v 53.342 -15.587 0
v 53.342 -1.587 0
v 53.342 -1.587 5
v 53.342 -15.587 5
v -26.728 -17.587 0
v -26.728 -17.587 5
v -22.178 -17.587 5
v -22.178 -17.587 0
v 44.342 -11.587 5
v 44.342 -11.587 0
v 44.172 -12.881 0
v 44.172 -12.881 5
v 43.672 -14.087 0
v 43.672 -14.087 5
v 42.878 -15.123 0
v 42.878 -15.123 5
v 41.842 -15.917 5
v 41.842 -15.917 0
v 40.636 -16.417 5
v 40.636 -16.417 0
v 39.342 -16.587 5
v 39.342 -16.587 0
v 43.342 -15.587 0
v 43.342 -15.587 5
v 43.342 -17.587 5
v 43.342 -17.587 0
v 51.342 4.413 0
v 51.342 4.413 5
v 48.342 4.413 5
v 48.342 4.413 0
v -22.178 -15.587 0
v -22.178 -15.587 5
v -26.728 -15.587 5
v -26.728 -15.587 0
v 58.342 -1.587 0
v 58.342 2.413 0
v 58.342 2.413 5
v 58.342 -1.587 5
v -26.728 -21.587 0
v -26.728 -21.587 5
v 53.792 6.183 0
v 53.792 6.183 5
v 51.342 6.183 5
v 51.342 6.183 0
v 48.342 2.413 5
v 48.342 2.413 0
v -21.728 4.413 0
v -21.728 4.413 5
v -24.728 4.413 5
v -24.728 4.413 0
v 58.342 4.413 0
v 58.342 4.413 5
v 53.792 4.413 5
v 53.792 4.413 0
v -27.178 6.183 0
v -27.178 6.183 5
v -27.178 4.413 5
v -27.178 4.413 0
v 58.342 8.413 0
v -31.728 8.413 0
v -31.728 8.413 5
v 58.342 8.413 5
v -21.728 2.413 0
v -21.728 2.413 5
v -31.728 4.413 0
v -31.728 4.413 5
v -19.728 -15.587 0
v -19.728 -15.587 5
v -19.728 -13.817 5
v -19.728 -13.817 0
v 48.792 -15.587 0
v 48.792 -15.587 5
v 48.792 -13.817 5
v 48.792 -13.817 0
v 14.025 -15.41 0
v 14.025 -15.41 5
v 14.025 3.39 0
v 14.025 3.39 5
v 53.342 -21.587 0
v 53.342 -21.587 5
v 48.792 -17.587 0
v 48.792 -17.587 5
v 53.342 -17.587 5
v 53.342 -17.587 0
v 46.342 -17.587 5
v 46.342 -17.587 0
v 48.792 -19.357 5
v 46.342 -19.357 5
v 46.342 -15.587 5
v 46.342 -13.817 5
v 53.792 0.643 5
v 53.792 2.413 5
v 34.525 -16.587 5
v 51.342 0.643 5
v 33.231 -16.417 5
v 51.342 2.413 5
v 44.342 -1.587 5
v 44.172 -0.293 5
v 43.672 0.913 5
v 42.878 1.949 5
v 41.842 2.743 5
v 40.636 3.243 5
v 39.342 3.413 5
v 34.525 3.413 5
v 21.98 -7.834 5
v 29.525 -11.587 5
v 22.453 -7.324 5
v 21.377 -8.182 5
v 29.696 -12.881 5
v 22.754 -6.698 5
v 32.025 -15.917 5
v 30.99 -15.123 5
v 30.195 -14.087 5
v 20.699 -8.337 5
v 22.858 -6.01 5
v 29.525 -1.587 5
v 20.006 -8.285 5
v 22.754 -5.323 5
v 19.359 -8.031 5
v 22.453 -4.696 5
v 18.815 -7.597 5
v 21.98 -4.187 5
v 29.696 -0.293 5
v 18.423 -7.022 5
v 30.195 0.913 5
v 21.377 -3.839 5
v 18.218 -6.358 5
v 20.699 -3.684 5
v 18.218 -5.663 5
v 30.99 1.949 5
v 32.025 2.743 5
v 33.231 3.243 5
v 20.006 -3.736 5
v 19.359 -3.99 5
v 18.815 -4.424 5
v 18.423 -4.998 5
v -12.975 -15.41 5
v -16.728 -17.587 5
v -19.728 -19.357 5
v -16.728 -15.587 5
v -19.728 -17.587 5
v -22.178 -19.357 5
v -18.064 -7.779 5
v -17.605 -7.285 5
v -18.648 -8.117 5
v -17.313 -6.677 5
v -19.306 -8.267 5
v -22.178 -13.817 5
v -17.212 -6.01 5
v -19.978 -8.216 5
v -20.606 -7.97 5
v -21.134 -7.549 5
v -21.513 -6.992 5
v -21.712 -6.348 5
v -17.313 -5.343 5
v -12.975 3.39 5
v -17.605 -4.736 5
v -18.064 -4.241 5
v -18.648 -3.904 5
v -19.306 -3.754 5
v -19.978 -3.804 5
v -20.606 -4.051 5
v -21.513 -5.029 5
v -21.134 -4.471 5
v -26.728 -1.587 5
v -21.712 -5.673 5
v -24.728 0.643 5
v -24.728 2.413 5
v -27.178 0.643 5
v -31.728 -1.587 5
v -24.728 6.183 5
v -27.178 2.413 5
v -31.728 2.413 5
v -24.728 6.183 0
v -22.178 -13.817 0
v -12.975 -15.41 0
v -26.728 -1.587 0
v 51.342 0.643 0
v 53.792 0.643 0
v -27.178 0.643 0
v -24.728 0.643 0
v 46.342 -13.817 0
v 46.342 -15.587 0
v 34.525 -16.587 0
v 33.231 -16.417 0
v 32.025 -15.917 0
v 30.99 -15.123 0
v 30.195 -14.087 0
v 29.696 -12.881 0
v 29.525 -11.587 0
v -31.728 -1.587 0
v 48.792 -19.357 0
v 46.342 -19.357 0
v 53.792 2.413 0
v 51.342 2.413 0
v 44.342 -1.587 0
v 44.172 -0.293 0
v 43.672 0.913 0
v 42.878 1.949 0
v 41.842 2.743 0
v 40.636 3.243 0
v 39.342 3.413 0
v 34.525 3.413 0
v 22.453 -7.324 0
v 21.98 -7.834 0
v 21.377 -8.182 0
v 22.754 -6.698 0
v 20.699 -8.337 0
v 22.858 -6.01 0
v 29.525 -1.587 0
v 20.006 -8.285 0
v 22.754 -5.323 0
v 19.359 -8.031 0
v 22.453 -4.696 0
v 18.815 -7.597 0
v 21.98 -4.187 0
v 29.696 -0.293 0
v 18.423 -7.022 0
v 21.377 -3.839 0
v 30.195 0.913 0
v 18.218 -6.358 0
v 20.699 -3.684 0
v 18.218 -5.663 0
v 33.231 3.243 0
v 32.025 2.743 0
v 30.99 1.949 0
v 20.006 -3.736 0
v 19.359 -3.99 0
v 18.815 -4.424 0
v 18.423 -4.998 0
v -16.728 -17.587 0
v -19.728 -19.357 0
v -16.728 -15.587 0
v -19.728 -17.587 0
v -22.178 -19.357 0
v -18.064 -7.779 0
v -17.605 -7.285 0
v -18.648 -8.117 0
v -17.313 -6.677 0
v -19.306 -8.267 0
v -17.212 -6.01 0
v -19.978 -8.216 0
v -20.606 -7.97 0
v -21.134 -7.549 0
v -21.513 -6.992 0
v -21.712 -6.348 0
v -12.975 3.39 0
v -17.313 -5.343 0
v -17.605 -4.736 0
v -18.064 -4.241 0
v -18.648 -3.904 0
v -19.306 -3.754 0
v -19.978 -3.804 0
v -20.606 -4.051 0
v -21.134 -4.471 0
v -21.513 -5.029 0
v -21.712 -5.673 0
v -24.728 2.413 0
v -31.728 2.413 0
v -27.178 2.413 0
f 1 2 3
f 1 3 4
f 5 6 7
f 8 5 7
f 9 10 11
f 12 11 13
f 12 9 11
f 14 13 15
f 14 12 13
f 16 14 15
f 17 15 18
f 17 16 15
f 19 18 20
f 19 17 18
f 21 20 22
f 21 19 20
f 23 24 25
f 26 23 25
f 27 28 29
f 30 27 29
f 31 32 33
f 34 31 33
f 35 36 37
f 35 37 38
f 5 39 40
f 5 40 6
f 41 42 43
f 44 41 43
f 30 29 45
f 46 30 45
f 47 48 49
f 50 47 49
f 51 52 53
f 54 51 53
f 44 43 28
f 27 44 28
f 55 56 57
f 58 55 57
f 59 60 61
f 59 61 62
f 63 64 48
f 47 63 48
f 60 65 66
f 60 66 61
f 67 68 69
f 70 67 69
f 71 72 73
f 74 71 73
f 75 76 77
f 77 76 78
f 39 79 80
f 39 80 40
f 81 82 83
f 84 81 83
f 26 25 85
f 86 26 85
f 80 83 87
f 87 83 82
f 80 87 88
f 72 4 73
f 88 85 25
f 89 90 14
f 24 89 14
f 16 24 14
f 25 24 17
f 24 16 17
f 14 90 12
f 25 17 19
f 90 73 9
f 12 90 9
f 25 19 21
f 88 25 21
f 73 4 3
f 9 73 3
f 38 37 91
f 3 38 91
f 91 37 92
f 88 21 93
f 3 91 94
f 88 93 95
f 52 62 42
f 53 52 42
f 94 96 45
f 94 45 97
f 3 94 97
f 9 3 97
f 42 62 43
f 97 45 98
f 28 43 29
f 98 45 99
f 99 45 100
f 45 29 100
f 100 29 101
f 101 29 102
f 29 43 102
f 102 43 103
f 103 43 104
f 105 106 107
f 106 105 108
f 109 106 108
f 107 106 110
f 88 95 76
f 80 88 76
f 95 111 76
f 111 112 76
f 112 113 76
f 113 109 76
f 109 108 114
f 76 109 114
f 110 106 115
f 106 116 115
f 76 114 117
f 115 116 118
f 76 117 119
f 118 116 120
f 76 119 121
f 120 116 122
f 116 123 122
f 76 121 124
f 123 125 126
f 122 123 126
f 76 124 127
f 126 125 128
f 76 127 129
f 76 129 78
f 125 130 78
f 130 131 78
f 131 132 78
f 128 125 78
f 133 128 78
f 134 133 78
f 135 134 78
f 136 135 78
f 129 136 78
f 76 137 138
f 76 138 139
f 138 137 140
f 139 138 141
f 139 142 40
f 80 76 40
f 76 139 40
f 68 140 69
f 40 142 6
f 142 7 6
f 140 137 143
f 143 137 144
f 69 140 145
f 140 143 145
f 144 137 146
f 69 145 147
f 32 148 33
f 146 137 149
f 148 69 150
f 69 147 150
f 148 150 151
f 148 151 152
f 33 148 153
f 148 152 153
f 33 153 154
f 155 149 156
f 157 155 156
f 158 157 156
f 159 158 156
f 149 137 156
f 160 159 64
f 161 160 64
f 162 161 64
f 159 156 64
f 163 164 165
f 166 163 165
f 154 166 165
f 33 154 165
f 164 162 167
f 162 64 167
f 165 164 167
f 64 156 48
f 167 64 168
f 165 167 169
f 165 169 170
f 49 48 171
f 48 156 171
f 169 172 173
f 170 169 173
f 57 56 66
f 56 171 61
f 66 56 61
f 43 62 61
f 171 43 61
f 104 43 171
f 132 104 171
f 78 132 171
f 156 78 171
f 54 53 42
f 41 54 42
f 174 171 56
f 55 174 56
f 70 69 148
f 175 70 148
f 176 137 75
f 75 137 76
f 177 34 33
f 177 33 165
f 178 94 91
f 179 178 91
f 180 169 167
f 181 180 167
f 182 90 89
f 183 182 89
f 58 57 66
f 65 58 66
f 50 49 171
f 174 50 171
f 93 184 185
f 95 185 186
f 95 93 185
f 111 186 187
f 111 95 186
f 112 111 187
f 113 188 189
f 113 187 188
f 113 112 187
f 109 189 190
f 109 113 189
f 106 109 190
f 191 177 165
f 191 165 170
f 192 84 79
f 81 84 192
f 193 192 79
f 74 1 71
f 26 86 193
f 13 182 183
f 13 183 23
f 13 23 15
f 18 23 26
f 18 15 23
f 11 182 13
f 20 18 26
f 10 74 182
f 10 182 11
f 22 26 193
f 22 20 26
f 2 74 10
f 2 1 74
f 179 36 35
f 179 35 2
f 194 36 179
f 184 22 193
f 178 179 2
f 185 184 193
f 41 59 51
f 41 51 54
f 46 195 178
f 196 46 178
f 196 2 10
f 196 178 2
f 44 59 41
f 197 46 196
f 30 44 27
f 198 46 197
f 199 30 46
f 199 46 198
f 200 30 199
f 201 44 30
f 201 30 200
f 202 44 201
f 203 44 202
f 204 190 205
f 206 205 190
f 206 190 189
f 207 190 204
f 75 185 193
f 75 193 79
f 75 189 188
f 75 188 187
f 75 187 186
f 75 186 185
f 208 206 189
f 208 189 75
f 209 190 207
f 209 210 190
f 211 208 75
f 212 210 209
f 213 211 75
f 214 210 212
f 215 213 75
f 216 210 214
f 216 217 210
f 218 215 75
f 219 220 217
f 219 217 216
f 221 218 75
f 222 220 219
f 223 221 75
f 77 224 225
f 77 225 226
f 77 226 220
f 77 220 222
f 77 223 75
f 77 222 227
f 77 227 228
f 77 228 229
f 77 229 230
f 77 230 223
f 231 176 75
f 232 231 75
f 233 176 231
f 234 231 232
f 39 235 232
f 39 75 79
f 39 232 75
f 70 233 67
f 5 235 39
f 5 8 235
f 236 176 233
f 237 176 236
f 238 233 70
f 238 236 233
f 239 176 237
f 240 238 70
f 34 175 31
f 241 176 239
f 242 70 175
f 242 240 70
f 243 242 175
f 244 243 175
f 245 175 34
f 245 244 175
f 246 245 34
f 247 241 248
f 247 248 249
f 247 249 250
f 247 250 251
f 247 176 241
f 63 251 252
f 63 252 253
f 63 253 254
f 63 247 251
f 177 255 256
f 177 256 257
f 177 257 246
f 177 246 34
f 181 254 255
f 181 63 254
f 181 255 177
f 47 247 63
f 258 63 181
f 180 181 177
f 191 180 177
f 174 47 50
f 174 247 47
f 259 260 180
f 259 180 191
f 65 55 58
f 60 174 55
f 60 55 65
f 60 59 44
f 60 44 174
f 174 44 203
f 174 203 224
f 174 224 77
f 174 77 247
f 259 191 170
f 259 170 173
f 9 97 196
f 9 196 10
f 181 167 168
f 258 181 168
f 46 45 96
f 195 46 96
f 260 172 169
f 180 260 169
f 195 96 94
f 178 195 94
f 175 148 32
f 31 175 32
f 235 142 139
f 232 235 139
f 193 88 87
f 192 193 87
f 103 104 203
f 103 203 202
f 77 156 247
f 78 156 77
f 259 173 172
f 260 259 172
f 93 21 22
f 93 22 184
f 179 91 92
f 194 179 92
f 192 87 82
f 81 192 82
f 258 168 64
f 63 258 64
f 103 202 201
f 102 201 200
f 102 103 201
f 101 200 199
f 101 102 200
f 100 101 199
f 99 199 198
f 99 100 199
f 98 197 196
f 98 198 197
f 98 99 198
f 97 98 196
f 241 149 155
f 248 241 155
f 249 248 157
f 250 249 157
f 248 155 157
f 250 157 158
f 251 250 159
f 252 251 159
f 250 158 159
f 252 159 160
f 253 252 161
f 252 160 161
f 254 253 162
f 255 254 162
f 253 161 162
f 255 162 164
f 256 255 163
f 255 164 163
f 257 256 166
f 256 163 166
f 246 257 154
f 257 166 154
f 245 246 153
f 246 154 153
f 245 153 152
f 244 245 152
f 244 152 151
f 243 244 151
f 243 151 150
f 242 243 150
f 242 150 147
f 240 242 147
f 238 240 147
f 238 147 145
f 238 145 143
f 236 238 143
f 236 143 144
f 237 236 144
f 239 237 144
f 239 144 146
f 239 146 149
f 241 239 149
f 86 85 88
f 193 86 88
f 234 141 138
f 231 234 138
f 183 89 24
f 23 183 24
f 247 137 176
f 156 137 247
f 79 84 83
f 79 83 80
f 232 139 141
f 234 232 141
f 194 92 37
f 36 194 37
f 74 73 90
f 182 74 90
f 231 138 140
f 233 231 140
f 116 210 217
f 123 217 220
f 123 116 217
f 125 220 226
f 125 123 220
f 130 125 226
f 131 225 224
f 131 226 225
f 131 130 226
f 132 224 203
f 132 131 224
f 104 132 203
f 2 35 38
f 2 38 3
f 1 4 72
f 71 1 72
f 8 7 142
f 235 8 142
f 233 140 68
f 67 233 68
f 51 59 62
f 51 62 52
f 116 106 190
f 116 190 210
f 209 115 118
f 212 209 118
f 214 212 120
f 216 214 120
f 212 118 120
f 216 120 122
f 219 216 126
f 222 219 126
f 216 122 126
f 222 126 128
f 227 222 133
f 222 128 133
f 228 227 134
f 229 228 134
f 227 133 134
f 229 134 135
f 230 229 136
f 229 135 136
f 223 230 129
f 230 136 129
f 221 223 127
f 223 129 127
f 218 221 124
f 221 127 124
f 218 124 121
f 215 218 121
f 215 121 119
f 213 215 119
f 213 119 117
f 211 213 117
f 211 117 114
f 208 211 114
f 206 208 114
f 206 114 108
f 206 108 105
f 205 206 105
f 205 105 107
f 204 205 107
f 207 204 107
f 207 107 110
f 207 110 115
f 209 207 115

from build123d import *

# Parameters (mm, degrees)
RESSALTO_EXTRUS_O1_DEPTH = 5
CORTE_EXTRUS_O1_DEPTH    = 6
ESBO_O3_R                = 2.262708027
ESBO_O3_R_2              = 2.332727501
ESBO_O3_W                = 27
ESBO_O3_H                = 18.8
CORTE_EXTRUS_O2_DEPTH    = 6


with BuildPart() as part:
    # Esboço1 → Ressalto-extrusão1 (new body)
    with BuildSketch(Plane.XY):
        Polygon((-26.727783806, -21.587024793), (-26.727783806, -1.587024793), (-31.727783806, -1.587024793), (-31.727783806, 8.412975207), (58.342216194, 8.412975207), (58.342216194, -1.587024793), (53.342216194, -1.587024793), (53.342216194, -21.587024793), align=None)
    extrude(amount=RESSALTO_EXTRUS_O1_DEPTH)

    # Esboço2 → Corte-extrusão1 (cut, through all)
    with BuildSketch(Plane.XY.offset(5)):
        Polygon((-31.727783806, 2.412975207), (-27.177783806, 2.412975207), (-27.177783806, 0.642975207), (-24.727783806, 0.642975207), (-24.727783806, 2.412975207), (-21.727783806, 2.412975207), (-21.727783806, 4.412975207), (-24.727783806, 4.412975207), (-24.727783806, 6.182975207), (-27.177783806, 6.182975207), (-27.177783806, 4.412975207), (-31.727783806, 4.412975207), align=None)
        Polygon((51.342216194, 4.412975207), (48.342216194, 4.412975207), (48.342216194, 2.412975207), (51.342216194, 2.412975207), (51.342216194, 0.642975207), (53.792216194, 0.642975207), (53.792216194, 2.412975207), (58.342216194, 2.412975207), (58.342216194, 4.412975207), (53.792216194, 4.412975207), (53.792216194, 6.182975207), (51.342216194, 6.182975207), align=None)
        Polygon((-26.727783806, -17.587024793), (-22.177783806, -17.587024793), (-22.177783806, -19.357024793), (-19.727783806, -19.357024793), (-19.727783806, -17.587024793), (-16.727783806, -17.587024793), (-16.727783806, -15.587024793), (-19.727783806, -15.587024793), (-19.727783806, -13.817024793), (-22.177783806, -13.817024793), (-22.177783806, -15.587024793), (-26.727783806, -15.587024793), align=None)
        Polygon((46.342216194, -15.587024793), (43.342216194, -15.587024793), (43.342216194, -17.587024793), (46.342216194, -17.587024793), (46.342216194, -19.357024793), (48.792216194, -19.357024793), (48.792216194, -17.587024793), (53.342216194, -17.587024793), (53.342216194, -15.587024793), (48.792216194, -15.587024793), (48.792216194, -13.817024793), (46.342216194, -13.817024793), align=None)
    extrude(amount=-CORTE_EXTRUS_O1_DEPTH, mode=Mode.SUBTRACT)

    # Esboço3 → Corte-extrusão2 (cut, through all)
    with BuildSketch(Plane.XY.offset(5)):
        with Locations((-19.474846983, -6.010345645)):
            Circle(ESBO_O3_R)
        with Locations((20.525153017, -6.010345645)):
            Circle(ESBO_O3_R_2)
        with Locations((0.525153017, -6.010345645)):
            Rectangle(ESBO_O3_W, ESBO_O3_H)
        with BuildLine():
            Line((34.525153017, 3.412975207), (39.342216194, 3.412975207))
            ThreePointArc((39.342216194, 3.412975207), (42.8777501, 1.948509113), (44.342216194, -1.587024793))
            Line((44.342216194, -1.587024793), (44.342216194, -11.587024793))
            ThreePointArc((44.342216194, -11.587024793), (42.8777501, -15.122558699), (39.342216194, -16.587024793))
            Line((39.342216194, -16.587024793), (34.525153017, -16.587024793))
            ThreePointArc((34.525153017, -16.587024793), (30.989619111, -15.122558699), (29.525153017, -11.587024793))
            Line((29.525153017, -11.587024793), (29.525153017, -1.587024793))
            ThreePointArc((29.525153017, -1.587024793), (30.989619111, 1.948509113), (34.525153017, 3.412975207))
        make_face()
    extrude(amount=-CORTE_EXTRUS_O2_DEPTH, mode=Mode.SUBTRACT)


solid = part.part
